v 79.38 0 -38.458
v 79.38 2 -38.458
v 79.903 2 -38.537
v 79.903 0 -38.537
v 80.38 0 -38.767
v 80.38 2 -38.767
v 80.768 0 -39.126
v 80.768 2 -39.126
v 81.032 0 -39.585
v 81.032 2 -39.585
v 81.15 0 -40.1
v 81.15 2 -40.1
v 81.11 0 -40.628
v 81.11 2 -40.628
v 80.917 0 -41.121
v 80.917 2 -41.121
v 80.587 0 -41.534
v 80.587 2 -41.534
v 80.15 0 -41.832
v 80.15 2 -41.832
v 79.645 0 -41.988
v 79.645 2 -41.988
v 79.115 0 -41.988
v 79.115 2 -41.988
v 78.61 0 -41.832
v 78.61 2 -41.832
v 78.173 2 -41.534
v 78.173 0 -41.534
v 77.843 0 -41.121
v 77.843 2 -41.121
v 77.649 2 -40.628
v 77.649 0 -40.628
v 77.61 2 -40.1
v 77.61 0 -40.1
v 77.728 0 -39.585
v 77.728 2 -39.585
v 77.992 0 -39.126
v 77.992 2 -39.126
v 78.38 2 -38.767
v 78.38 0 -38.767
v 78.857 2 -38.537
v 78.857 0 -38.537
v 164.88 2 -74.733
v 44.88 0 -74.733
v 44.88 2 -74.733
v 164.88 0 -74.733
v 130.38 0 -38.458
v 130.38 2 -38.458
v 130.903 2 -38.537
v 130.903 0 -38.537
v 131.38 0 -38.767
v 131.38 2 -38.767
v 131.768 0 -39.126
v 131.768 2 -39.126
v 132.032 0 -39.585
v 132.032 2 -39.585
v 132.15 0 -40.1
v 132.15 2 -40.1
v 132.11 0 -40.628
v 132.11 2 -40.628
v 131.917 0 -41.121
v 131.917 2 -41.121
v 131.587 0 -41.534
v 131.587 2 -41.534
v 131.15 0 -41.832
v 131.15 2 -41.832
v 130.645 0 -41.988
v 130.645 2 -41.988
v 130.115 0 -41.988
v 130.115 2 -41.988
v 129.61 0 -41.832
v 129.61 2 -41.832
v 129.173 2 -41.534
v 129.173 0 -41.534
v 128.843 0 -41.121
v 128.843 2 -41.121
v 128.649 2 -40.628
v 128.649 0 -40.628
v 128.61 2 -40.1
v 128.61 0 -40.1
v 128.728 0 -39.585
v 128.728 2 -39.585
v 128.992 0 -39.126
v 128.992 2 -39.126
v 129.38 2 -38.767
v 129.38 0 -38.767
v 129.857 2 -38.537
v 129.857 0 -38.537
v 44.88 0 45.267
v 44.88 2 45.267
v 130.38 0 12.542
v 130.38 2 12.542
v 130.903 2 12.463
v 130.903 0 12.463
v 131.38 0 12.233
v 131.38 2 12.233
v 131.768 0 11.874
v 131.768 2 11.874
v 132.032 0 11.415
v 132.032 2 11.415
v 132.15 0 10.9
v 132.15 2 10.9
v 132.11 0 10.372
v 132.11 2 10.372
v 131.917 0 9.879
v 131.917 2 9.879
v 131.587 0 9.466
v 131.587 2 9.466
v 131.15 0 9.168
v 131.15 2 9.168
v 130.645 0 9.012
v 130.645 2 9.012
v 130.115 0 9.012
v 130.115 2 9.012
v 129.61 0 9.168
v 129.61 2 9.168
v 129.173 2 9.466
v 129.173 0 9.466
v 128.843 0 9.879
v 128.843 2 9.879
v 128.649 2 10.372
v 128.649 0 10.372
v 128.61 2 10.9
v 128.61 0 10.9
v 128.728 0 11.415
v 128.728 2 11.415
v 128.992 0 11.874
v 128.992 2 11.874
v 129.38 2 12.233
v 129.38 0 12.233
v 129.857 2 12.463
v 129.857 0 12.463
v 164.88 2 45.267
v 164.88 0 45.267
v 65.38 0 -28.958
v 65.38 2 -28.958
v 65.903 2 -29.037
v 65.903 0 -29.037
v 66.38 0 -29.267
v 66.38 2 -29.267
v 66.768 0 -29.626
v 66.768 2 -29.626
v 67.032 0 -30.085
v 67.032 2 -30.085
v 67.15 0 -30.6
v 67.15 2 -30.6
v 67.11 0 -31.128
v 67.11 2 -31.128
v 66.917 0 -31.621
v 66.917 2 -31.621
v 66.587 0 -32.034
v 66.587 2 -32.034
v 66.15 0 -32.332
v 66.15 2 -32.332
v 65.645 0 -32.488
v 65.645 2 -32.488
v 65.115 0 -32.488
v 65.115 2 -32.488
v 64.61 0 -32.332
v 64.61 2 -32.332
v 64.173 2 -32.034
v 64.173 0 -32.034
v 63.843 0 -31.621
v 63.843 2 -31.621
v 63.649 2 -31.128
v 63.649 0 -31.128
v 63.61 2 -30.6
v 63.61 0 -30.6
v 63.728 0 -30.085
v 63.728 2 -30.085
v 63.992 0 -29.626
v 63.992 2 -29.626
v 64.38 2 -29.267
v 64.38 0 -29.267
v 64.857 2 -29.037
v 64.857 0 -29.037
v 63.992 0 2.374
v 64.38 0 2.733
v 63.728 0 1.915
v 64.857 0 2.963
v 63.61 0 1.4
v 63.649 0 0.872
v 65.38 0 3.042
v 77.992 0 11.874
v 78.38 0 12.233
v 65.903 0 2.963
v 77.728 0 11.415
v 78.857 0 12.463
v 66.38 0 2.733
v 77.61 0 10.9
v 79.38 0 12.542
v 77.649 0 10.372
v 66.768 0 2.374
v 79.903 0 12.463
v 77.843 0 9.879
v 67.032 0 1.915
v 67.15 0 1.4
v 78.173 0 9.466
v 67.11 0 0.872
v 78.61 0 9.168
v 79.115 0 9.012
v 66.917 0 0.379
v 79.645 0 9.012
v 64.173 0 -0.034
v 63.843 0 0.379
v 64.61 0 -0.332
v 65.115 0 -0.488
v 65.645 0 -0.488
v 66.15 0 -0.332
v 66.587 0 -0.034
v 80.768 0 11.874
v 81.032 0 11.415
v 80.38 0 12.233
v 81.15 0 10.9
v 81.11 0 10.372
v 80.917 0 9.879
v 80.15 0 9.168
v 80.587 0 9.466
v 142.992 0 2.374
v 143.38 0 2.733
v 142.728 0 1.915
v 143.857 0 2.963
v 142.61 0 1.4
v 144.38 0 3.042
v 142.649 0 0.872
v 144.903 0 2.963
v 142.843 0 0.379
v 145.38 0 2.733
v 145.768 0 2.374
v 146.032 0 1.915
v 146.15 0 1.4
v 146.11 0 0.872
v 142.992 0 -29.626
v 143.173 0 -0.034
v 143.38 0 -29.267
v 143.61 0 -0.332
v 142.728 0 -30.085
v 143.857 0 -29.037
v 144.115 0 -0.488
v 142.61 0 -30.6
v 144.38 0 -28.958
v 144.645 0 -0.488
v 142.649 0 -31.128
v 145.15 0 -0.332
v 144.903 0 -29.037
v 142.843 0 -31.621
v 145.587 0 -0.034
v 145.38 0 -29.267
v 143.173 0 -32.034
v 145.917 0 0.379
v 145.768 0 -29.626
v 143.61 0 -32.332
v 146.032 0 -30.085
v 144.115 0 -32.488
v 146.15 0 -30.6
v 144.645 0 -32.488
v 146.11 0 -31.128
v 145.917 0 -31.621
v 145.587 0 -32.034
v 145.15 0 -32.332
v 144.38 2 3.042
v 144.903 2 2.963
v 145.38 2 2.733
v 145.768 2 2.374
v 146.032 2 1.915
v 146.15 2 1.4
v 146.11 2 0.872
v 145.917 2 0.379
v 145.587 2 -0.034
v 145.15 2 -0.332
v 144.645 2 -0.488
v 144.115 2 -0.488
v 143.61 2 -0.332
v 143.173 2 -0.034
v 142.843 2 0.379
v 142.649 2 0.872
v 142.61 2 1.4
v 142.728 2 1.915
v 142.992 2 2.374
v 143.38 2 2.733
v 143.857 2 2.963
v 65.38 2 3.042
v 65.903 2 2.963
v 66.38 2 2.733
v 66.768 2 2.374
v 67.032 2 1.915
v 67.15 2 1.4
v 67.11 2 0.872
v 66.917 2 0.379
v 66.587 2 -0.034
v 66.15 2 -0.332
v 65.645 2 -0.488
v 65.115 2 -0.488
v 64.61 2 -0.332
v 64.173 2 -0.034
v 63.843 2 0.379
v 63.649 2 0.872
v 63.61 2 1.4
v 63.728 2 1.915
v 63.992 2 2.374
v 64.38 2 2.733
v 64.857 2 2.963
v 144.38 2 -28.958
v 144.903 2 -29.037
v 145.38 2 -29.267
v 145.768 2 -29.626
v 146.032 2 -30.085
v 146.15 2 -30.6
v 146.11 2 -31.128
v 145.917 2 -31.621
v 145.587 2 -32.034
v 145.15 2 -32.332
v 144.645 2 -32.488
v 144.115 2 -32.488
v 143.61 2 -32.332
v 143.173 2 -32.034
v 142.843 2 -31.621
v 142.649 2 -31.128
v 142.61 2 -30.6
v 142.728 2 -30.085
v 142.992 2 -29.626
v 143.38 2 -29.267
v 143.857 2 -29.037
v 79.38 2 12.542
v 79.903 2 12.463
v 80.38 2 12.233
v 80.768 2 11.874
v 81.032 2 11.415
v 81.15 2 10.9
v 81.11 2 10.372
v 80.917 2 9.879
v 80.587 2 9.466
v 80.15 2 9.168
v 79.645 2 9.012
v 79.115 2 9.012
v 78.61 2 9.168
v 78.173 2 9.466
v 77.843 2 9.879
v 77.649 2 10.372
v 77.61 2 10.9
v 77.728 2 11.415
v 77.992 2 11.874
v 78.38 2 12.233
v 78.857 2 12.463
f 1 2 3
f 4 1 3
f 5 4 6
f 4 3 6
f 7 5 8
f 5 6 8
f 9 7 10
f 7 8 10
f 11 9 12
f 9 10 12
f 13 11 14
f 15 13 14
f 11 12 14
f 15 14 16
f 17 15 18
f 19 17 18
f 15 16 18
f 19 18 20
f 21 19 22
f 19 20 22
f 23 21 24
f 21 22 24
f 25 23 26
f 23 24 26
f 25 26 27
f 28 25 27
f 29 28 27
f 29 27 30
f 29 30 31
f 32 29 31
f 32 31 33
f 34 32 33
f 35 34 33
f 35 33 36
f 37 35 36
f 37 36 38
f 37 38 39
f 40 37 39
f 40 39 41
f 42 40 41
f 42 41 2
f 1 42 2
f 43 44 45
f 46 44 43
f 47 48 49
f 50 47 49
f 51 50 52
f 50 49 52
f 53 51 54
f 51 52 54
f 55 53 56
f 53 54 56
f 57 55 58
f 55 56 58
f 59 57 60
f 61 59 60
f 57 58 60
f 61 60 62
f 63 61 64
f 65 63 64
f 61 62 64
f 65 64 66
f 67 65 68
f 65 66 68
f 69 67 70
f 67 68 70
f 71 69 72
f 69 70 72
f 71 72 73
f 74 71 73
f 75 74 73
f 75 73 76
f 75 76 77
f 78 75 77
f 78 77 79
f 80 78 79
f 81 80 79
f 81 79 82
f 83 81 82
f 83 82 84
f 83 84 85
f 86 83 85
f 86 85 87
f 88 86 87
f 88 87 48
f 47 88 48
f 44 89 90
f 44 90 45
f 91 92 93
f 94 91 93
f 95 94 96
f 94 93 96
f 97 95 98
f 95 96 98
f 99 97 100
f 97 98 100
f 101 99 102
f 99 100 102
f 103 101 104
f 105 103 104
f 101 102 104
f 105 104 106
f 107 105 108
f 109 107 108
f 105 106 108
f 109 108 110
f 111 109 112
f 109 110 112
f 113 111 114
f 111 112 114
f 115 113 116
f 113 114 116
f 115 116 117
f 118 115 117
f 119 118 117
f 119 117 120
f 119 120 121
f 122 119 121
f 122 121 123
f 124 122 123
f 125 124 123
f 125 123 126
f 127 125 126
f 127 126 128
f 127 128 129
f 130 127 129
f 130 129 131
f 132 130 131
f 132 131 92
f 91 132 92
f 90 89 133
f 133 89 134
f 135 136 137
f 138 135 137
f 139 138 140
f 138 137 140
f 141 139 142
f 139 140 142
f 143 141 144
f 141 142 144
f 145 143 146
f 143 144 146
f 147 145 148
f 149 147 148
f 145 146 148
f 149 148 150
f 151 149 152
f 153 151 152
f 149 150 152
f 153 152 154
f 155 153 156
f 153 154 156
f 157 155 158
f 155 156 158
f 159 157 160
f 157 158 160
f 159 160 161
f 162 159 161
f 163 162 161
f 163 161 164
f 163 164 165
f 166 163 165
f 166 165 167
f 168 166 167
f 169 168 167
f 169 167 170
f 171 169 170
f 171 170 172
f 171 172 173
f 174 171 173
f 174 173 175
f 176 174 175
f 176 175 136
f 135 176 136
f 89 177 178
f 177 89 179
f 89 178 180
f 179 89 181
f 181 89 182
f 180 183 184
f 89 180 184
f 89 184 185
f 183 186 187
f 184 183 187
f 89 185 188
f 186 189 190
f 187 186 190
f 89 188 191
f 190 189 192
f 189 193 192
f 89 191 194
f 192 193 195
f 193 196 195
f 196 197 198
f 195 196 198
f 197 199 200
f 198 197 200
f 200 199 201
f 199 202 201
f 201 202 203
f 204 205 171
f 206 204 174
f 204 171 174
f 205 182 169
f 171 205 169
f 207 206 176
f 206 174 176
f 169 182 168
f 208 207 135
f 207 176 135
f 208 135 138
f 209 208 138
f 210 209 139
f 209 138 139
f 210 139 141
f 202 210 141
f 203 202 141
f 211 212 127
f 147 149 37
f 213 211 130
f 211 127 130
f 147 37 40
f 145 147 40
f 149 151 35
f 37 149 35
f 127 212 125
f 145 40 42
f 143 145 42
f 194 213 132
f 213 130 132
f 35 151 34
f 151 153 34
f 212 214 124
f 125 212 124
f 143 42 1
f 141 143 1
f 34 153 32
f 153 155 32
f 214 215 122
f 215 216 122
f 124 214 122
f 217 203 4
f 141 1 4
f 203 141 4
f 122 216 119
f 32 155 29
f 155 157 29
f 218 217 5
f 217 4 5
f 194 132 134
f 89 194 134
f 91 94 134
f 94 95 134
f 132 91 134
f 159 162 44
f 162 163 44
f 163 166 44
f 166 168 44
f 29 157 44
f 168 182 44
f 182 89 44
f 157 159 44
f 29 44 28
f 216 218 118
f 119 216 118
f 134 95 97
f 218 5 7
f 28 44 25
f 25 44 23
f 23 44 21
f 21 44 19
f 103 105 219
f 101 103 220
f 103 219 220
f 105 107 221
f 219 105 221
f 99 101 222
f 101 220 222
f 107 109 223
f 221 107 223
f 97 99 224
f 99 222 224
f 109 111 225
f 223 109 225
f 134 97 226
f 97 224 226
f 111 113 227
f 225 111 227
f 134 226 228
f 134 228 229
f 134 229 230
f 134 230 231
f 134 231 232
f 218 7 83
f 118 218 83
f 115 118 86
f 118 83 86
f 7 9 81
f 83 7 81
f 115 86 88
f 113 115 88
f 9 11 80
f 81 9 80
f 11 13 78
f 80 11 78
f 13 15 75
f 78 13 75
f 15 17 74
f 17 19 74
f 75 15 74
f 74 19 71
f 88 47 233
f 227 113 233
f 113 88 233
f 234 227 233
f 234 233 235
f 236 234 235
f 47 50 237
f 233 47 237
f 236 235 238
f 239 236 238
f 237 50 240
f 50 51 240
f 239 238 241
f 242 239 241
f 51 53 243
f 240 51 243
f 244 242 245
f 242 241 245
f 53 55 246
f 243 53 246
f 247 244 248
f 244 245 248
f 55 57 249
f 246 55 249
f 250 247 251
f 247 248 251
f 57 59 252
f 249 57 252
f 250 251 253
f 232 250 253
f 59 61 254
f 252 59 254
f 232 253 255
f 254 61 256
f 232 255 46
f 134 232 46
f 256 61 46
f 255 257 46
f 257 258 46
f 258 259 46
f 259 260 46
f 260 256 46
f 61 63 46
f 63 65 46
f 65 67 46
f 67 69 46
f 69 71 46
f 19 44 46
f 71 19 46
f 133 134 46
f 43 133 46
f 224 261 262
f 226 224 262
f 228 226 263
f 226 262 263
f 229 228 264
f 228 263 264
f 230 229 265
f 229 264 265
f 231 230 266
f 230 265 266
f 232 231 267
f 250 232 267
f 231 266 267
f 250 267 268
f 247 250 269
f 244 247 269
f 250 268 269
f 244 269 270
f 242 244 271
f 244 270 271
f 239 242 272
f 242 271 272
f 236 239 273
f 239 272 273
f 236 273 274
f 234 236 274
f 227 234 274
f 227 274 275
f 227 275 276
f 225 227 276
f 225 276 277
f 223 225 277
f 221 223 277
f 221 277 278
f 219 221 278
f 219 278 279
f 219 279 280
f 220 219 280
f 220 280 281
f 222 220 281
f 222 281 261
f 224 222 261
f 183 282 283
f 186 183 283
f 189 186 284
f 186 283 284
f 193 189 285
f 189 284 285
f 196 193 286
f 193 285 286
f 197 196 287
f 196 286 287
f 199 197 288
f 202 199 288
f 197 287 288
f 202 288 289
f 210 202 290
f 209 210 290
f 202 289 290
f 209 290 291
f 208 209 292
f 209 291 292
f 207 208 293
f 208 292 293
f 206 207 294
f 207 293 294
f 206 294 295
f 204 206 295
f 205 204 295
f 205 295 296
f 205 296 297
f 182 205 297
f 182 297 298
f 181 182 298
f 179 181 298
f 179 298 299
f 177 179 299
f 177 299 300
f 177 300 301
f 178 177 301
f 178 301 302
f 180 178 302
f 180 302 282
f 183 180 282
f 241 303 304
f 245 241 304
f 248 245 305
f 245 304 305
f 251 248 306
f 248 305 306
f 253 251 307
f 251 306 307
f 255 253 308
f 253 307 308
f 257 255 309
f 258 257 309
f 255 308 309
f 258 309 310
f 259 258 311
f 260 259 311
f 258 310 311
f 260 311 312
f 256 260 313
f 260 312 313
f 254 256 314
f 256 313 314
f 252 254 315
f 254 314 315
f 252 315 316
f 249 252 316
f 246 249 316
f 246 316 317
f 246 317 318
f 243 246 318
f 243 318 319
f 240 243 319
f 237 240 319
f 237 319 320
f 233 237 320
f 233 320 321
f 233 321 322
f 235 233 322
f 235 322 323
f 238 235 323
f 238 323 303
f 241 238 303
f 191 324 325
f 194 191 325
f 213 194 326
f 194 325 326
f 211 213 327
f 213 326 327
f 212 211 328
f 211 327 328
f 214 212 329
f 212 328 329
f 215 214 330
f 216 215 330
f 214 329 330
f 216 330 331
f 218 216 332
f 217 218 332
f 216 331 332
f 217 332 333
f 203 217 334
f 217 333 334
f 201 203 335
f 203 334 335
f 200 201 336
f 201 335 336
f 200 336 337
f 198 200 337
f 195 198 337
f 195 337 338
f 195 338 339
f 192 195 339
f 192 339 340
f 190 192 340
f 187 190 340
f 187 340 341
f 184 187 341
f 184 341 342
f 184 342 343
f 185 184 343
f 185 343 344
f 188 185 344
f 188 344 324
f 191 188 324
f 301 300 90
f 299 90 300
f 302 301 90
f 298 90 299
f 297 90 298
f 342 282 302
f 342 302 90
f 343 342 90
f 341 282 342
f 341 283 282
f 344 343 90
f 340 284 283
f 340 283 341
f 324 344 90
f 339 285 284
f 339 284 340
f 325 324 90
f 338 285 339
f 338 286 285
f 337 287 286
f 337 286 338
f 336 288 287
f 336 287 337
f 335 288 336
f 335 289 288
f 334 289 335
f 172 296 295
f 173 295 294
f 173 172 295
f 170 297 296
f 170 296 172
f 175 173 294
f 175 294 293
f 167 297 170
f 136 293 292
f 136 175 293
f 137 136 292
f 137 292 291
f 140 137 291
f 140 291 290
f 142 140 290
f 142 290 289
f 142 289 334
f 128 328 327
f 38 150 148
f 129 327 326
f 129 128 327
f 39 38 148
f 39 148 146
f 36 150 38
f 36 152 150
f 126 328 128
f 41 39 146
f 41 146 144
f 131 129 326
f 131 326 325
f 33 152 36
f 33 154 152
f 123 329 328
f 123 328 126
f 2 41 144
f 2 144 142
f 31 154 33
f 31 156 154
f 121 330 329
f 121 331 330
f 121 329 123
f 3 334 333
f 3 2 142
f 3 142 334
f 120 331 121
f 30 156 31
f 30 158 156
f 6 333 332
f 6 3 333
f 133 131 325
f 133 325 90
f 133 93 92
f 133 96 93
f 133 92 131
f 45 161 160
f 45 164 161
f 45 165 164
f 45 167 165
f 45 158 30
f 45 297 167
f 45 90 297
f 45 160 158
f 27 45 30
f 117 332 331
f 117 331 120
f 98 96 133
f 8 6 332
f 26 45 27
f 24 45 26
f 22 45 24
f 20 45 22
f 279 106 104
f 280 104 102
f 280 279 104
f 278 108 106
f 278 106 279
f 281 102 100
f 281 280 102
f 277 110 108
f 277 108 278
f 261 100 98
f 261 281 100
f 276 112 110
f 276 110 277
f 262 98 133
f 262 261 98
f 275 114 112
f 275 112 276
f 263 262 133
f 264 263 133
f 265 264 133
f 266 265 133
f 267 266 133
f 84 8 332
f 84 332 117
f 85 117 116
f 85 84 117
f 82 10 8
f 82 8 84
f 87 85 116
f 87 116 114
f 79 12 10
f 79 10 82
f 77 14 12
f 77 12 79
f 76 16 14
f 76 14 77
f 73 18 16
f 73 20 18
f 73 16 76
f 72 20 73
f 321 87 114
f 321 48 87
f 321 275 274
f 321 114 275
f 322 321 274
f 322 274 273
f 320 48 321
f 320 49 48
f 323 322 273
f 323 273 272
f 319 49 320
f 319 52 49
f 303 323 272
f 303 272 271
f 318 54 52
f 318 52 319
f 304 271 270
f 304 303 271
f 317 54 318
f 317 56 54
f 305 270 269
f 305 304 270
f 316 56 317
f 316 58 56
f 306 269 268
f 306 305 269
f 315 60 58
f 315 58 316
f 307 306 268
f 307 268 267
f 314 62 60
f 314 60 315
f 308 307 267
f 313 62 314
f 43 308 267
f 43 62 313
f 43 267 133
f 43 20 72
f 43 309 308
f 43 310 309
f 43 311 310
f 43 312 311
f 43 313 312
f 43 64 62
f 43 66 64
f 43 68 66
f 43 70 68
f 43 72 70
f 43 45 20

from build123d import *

# Parameters (mm, degrees)
SKETCH1_W           = 120
SKETCH1_H           = 120
BOSS_EXTRUDE1_DEPTH = 2
SKETCH2_R           = 1.775
CUT_EXTRUDE1_DEPTH  = 182.037166061
SKETCH3_R           = 1.775
CUT_EXTRUDE2_DEPTH  = 182.037166061


with BuildPart() as part:
    # Sketch1 → Boss-Extrude1 (new body)
    with BuildSketch(Plane(origin=(0, 0, 0), x_dir=(1, 0, 0), z_dir=(0, 1, 0))):
        with Locations((104.879995502, 14.733142437)):
            Rectangle(SKETCH1_W, SKETCH1_H)
    extrude(amount=BOSS_EXTRUDE1_DEPTH)

    # Sketch2 → Cut-Extrude1 (cut, through all)
    with BuildSketch(Plane(origin=(0, 2, 0), x_dir=(1, 0, 0), z_dir=(0, 1, 0))):
        with Locations(Location((65.379995502, 30.733142437, 0), (0, 0, 270))):
            Circle(SKETCH2_R)
        with Locations(Location((65.379995502, -1.266857563, 0), (0, 0, 270))):
            Circle(SKETCH2_R)
        with Locations(Location((144.379995502, -1.266857563, 0), (0, 0, 270))):
            Circle(SKETCH2_R)
        with Locations(Location((144.379995502, 30.733142437, 0), (0, 0, 270))):
            Circle(SKETCH2_R)
    extrude(amount=-CUT_EXTRUDE1_DEPTH, mode=Mode.SUBTRACT)

    # Sketch3 → Cut-Extrude2 (cut, through all)
    with BuildSketch(Plane(origin=(0, 2, 0), x_dir=(1, 0, 0), z_dir=(0, 1, 0))):
        with Locations(Location((79.379995502, -10.766857563, 0), (0, 0, 270))):
            Circle(SKETCH3_R)
        with Locations(Location((79.379995502, 40.233142437, 0), (0, 0, 270))):
            Circle(SKETCH3_R)
        with Locations(Location((130.379995502, -10.766857563, 0), (0, 0, 270))):
            Circle(SKETCH3_R)
        with Locations(Location((130.379995502, 40.233142437, 0), (0, 0, 270))):
            Circle(SKETCH3_R)
    extrude(amount=-CUT_EXTRUDE2_DEPTH, mode=Mode.SUBTRACT)


solid = part.part
